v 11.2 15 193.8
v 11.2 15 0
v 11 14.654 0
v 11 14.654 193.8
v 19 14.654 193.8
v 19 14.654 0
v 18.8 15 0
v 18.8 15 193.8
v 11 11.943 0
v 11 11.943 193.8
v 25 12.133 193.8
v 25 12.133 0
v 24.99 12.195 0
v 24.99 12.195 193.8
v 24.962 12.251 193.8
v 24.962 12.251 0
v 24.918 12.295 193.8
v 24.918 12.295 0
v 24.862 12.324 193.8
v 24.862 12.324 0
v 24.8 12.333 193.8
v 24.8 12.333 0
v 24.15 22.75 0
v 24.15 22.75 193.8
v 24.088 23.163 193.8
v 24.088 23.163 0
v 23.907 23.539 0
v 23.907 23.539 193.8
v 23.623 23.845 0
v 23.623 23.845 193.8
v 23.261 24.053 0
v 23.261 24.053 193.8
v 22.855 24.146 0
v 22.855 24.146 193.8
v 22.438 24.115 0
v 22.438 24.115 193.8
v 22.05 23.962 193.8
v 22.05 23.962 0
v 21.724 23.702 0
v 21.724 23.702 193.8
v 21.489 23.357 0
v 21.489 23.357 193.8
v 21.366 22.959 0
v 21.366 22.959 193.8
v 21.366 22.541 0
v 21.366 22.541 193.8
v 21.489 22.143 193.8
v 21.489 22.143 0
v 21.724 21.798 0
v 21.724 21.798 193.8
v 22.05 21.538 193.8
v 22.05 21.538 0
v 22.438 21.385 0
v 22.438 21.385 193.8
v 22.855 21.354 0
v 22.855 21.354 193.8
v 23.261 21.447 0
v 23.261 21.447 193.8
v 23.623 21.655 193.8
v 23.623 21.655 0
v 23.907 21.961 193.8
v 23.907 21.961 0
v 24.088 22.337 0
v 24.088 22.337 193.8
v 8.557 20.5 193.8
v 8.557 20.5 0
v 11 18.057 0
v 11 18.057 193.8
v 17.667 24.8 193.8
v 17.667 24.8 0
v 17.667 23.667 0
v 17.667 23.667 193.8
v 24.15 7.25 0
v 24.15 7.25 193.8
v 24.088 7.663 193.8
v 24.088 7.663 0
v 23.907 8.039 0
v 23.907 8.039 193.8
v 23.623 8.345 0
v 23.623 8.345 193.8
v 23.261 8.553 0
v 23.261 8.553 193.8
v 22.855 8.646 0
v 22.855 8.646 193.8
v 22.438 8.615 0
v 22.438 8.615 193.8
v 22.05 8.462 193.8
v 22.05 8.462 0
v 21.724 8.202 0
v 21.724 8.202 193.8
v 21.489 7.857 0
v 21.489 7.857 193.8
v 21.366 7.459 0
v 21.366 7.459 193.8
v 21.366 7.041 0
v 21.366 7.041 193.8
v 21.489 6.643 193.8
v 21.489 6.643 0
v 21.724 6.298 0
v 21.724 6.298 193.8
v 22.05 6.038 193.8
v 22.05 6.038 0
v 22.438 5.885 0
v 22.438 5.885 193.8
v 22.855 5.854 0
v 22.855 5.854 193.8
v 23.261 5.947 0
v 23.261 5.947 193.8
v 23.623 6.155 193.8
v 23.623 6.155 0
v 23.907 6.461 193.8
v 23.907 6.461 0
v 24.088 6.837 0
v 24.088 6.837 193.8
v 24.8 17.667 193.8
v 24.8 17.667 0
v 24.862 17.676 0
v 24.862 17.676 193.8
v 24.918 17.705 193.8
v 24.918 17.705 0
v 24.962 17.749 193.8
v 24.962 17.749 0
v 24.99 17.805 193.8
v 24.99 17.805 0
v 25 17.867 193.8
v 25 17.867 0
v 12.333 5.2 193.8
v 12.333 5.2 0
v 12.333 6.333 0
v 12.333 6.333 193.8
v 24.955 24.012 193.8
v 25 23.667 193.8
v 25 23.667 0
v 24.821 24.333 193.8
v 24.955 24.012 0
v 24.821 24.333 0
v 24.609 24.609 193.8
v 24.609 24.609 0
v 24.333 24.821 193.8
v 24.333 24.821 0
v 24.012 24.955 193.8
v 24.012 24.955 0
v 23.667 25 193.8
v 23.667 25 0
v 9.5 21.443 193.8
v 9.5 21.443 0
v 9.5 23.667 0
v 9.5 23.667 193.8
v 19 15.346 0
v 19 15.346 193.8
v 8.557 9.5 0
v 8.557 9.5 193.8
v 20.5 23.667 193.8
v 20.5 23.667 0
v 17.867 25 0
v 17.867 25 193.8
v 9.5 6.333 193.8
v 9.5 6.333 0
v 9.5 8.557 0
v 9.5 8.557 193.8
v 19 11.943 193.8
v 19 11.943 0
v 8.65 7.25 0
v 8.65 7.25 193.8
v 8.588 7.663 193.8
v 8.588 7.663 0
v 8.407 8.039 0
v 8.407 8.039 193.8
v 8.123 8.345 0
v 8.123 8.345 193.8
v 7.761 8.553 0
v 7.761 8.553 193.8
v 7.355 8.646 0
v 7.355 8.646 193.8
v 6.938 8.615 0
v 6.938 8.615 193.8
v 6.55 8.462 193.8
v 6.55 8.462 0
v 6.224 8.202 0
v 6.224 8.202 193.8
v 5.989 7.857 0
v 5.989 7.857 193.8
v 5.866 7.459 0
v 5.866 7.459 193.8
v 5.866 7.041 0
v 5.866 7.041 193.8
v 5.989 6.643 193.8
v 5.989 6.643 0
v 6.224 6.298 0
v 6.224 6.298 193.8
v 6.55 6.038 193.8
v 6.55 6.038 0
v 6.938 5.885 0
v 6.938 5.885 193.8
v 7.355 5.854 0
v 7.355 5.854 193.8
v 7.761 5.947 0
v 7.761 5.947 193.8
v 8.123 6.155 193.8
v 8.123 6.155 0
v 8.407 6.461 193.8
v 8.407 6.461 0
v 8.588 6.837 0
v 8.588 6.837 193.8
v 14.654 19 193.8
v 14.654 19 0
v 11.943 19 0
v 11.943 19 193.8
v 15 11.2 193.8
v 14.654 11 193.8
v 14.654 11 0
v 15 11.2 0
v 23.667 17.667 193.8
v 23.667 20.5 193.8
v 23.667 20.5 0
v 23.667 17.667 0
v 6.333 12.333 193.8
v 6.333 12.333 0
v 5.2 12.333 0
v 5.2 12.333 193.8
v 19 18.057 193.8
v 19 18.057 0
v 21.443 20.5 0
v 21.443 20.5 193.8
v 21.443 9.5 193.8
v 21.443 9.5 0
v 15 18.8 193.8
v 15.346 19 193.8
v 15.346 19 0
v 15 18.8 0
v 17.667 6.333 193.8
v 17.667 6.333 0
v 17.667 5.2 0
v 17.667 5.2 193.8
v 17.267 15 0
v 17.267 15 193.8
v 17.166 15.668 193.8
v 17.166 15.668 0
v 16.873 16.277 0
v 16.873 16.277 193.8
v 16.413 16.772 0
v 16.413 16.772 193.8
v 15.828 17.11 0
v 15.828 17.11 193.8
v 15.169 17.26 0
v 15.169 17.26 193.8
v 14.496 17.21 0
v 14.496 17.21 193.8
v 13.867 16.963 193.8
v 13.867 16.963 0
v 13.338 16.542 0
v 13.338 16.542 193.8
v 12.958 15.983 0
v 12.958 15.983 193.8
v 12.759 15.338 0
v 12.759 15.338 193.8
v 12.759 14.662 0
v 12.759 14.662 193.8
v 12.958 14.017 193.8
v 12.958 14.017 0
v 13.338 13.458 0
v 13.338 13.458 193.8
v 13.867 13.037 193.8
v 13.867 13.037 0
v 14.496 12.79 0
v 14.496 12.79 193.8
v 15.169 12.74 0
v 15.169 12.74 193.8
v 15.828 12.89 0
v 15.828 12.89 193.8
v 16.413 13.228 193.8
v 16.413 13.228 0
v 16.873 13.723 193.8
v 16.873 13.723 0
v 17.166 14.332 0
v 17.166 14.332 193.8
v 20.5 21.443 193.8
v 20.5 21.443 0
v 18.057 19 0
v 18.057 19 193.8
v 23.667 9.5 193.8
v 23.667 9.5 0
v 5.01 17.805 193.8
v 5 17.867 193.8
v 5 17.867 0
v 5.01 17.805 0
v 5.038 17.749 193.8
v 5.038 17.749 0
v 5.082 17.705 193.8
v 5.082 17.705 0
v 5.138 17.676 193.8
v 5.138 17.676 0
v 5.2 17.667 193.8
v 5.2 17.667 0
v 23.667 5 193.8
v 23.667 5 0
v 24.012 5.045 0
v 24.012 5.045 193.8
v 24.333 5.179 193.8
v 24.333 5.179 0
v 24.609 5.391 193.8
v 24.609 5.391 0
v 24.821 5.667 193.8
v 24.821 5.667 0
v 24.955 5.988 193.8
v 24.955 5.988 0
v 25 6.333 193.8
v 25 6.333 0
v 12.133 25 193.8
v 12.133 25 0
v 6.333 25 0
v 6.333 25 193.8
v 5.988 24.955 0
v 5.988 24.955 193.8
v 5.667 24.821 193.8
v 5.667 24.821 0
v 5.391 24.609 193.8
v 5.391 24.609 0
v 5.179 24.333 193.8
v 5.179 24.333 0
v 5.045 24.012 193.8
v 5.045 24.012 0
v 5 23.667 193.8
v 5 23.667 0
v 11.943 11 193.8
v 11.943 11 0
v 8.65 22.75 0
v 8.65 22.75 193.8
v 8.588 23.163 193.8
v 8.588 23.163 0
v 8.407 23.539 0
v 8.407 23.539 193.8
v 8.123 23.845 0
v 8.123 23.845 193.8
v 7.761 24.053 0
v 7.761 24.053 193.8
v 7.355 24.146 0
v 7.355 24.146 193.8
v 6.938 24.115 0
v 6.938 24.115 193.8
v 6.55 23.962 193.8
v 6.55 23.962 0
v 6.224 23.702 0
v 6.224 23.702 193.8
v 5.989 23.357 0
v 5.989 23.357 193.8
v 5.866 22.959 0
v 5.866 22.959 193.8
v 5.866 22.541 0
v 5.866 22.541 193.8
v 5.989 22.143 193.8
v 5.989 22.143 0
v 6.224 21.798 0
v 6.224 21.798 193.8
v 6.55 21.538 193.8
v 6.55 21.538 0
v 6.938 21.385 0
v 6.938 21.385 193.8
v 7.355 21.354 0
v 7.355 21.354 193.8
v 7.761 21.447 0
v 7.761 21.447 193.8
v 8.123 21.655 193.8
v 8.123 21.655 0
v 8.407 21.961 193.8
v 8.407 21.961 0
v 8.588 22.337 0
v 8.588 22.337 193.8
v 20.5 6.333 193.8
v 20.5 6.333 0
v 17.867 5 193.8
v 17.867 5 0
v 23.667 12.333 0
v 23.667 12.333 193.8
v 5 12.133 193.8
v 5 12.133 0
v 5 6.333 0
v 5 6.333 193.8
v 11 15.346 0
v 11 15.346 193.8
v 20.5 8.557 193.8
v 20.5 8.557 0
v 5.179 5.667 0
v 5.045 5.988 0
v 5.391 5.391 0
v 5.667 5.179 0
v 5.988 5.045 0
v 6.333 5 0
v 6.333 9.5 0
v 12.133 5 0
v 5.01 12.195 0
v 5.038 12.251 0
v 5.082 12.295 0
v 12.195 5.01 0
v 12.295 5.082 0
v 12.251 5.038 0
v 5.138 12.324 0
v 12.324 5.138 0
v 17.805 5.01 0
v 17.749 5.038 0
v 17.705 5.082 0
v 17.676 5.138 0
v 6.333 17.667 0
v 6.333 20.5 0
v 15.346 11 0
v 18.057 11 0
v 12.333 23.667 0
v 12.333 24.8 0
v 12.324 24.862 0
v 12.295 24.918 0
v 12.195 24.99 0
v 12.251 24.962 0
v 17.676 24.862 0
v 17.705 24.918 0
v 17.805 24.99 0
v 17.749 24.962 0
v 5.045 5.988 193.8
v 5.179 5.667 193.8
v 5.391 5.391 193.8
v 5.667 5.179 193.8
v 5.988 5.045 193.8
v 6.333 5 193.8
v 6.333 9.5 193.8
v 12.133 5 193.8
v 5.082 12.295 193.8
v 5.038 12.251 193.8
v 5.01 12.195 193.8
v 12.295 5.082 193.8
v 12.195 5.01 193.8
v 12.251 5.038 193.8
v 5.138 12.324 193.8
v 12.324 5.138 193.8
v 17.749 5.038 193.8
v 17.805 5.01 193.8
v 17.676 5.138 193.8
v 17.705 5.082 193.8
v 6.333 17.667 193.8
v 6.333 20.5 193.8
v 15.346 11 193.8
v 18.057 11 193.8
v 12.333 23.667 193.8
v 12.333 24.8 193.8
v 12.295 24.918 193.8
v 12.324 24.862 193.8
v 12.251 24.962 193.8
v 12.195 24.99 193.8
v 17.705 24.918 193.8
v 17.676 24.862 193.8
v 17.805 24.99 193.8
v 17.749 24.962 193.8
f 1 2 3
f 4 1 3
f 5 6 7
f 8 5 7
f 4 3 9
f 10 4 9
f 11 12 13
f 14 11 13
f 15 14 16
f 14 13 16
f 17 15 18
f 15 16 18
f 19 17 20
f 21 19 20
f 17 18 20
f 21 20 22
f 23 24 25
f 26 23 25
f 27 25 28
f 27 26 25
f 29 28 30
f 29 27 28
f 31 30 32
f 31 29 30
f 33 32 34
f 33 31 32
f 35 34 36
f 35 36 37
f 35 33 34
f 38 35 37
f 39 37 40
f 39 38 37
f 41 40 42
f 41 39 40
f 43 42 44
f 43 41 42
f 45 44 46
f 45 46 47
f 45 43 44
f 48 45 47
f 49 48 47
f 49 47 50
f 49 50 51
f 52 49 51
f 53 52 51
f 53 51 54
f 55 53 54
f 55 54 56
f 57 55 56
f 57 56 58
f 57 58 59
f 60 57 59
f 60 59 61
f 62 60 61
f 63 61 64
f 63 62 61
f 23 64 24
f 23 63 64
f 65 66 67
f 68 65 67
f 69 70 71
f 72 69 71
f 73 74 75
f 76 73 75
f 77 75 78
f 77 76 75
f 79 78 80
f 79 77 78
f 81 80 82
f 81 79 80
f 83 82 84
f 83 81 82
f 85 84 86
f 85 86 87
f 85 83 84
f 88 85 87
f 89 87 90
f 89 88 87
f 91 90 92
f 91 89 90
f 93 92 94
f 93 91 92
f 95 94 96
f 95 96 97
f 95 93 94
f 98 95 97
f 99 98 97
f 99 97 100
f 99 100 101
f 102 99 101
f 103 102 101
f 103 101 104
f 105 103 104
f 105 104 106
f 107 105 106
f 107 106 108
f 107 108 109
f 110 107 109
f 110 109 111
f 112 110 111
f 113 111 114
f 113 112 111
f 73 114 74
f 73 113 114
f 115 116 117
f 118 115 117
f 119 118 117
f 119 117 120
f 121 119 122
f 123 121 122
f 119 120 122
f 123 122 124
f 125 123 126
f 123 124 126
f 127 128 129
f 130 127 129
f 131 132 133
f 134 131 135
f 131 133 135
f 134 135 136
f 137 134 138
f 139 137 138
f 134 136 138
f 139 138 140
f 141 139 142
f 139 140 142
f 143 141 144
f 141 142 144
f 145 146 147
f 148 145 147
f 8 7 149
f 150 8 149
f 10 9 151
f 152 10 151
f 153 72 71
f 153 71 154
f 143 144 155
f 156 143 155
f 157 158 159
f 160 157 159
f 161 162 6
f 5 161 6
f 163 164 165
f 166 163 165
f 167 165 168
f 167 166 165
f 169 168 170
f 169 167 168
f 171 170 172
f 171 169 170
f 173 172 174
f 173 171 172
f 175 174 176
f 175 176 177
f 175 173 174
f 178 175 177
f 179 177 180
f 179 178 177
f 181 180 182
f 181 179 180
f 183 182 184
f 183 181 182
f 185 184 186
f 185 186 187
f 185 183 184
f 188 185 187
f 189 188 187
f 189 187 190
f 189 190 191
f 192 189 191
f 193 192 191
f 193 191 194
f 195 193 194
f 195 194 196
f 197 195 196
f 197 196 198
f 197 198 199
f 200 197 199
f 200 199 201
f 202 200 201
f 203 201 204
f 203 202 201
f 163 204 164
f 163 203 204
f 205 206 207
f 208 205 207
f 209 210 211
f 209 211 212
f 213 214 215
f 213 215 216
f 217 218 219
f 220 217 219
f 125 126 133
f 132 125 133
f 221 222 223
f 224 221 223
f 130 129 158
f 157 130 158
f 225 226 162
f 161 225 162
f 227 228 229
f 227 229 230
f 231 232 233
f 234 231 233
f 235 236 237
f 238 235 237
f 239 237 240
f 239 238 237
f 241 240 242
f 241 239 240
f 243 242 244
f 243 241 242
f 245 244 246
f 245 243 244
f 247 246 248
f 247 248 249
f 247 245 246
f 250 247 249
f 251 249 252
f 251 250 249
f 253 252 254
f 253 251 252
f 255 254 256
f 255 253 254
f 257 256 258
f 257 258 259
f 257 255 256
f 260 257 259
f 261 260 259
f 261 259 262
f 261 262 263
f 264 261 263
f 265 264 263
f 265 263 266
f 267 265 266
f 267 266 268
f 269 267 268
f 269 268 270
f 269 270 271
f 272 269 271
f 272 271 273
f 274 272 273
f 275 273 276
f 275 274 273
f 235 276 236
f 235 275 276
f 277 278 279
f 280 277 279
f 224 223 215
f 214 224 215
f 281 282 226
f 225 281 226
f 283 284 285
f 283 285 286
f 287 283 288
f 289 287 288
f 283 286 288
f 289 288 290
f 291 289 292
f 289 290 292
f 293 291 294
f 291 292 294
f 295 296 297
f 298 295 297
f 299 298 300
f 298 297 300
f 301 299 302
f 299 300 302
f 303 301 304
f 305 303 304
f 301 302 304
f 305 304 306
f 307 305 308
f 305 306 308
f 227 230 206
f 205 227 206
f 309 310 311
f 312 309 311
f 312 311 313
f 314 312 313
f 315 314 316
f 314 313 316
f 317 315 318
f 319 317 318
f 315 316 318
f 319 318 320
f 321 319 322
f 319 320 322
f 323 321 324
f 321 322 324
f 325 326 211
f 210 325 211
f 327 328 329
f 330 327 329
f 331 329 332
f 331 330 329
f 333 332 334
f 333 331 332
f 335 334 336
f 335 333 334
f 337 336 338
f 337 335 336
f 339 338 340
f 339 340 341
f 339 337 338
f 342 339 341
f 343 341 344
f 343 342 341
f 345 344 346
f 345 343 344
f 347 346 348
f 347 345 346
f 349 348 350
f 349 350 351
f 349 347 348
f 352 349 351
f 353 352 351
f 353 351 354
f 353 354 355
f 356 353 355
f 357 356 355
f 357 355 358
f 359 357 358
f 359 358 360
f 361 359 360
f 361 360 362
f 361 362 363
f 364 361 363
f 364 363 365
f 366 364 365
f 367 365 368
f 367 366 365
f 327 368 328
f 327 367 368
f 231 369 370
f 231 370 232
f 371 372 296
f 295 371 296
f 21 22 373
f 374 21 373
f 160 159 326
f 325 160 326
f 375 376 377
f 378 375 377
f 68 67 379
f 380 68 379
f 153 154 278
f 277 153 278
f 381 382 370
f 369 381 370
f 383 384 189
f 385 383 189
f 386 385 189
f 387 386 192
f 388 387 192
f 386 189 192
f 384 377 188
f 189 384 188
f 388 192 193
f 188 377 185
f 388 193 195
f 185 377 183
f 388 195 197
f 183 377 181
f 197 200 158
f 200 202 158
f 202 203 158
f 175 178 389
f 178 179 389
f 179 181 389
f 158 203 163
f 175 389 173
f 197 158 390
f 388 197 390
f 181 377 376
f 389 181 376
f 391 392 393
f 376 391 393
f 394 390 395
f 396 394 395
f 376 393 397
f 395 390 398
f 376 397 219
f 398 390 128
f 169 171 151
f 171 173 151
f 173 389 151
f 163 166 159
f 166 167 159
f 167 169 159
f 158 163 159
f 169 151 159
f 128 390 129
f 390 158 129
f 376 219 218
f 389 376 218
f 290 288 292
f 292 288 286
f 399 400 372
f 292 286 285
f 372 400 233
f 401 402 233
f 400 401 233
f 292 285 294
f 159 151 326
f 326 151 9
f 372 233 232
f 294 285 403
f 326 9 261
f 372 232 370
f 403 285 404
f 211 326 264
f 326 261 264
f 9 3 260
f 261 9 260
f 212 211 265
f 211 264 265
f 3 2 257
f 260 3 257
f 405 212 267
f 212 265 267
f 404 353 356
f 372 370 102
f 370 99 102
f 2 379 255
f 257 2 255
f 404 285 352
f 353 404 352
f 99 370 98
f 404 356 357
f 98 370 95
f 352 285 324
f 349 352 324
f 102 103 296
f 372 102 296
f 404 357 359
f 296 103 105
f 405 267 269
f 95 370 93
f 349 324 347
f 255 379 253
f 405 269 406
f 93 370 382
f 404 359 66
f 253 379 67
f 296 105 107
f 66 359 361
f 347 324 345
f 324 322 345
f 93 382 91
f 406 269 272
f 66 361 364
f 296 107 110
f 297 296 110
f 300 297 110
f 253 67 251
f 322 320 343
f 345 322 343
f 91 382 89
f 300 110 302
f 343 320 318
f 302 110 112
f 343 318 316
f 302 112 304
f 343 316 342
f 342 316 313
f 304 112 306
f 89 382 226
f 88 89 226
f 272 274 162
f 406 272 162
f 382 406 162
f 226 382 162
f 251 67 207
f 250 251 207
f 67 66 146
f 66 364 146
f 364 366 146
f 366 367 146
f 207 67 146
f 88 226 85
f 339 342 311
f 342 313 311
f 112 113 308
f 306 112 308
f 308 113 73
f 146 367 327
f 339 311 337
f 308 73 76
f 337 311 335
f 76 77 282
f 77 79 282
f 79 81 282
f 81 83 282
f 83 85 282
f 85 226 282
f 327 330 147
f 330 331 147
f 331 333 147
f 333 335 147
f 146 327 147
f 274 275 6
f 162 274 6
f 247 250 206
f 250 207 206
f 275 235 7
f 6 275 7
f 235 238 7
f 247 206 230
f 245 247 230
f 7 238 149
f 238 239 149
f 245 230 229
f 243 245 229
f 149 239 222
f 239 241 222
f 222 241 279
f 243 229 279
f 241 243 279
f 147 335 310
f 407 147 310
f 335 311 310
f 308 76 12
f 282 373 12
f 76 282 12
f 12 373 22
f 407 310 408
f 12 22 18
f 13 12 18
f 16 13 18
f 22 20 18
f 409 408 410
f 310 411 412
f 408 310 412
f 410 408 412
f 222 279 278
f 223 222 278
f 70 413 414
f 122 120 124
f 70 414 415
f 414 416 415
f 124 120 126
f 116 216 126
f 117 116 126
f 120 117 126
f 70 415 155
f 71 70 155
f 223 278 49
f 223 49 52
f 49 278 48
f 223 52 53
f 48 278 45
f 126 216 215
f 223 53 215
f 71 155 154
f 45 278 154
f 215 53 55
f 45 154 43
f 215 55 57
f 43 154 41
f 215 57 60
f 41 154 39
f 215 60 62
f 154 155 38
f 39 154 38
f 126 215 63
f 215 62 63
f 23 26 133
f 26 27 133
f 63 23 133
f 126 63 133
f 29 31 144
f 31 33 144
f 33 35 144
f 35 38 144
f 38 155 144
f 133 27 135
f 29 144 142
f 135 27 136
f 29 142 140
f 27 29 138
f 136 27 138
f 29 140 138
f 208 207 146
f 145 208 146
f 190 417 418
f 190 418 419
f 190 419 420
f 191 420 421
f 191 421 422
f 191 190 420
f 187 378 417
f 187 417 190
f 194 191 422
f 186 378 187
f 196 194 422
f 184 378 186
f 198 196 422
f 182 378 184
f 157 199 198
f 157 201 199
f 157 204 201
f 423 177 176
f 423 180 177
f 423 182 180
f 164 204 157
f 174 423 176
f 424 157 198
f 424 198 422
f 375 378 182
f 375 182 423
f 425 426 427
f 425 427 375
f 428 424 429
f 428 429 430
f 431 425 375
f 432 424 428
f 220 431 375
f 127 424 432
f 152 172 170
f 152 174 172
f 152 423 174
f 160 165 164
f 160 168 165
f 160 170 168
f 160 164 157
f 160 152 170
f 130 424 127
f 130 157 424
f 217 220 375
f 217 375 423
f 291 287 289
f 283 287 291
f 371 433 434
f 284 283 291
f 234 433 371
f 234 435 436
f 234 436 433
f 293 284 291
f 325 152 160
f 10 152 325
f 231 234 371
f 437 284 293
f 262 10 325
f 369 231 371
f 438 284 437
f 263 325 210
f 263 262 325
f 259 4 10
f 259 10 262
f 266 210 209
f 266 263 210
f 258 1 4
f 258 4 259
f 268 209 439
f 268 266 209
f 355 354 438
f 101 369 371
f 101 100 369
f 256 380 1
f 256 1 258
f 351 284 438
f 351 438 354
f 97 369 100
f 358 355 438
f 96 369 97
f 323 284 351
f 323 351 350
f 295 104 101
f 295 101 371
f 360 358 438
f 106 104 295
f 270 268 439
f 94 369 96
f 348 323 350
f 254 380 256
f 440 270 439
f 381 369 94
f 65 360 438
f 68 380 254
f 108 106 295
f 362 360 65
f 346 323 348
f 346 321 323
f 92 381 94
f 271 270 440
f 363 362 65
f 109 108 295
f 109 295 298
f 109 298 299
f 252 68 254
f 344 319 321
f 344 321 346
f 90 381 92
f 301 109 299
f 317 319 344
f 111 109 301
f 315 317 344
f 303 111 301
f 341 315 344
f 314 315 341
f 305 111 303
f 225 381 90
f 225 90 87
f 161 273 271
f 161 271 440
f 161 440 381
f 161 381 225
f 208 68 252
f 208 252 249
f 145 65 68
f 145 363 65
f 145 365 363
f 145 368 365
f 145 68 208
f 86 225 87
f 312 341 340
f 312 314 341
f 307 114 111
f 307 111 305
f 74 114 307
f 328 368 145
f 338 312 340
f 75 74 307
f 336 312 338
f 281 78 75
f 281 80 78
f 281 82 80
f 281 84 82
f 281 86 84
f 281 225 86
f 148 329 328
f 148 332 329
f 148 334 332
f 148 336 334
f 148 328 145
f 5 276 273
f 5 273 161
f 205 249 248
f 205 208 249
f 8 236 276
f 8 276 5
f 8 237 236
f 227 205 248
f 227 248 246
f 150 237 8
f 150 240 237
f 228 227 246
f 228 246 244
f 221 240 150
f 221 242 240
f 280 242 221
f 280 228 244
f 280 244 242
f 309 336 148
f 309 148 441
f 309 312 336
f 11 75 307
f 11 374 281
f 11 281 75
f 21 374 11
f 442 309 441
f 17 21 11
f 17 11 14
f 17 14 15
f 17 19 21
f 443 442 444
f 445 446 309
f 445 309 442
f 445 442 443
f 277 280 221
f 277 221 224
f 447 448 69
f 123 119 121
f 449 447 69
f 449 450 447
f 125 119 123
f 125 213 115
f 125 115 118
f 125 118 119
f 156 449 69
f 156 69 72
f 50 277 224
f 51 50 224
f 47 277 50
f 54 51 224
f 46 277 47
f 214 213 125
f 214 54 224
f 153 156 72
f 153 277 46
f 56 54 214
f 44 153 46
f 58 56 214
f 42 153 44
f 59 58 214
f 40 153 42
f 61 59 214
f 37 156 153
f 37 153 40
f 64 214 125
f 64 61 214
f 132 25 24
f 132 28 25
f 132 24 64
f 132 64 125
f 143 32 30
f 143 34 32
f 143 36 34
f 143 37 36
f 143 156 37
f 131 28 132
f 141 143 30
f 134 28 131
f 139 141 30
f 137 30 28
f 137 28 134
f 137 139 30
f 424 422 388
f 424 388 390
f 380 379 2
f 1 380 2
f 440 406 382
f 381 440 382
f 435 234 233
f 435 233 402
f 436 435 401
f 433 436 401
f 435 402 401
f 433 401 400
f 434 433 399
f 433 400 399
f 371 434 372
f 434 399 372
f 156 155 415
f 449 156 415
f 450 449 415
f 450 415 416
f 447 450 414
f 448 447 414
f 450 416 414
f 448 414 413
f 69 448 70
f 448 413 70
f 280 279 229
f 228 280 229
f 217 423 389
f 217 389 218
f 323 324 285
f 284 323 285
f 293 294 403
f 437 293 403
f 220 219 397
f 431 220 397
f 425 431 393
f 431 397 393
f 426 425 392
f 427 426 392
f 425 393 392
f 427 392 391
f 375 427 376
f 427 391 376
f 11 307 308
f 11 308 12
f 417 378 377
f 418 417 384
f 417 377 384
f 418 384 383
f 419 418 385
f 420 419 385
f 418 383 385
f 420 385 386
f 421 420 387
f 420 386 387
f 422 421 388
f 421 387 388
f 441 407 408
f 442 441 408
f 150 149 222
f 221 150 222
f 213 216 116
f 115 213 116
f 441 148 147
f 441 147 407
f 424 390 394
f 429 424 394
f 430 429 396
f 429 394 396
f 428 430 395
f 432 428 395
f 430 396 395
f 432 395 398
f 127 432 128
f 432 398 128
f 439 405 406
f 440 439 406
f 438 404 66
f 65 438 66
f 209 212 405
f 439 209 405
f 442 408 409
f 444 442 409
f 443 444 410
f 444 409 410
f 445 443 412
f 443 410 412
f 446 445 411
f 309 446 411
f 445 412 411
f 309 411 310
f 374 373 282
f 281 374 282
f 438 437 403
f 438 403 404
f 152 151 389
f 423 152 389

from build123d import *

# Parameters (mm, degrees)
SKETCH_1_R      = 1.4
SKETCH_1_R_2    = 2.266666667
EXTRUDE_1_DEPTH = 193.8


with BuildPart() as part:
    # 草图1 → 凸台-拉伸1 (new body)
    with BuildSketch(Plane.XY):
        with BuildLine():
            Line((5, 23.666666667), (5, 17.866666667))
            ThreePointArc((5, 17.866666667), (5.058578644, 17.72524531), (5.2, 17.666666667))
            Line((5.2, 17.666666667), (6.333333333, 17.666666667))
            Line((6.333333333, 17.666666667), (6.333333333, 20.5))
            Line((6.333333333, 20.5), (8.557190958, 20.5))
            Line((8.557190958, 20.5), (11, 18.057190958))
            Line((11, 18.057190958), (11, 15.346410162))
            Line((11, 15.346410162), (11.199999976, 15.000000042))
            Line((11.199999976, 15.000000042), (11, 14.653589838))
            Line((11, 14.653589838), (11, 11.942809042))
            Line((11, 11.942809042), (8.557190958, 9.5))
            Line((8.557190958, 9.5), (6.333333333, 9.5))
            Line((6.333333333, 9.5), (6.333333333, 12.333333333))
            Line((6.333333333, 12.333333333), (5.2, 12.333333333))
            ThreePointArc((5.2, 12.333333333), (5.058578644, 12.27475469), (5, 12.133333333))
            Line((5, 12.133333333), (5, 6.333333333))
            ThreePointArc((5, 6.333333333), (5.390524292, 5.390524292), (6.333333333, 5))
            Line((6.333333333, 5), (12.133333333, 5))
            ThreePointArc((12.133333333, 5), (12.27475469, 5.058578644), (12.333333333, 5.2))
            Line((12.333333333, 5.2), (12.333333333, 6.333333333))
            Line((12.333333333, 6.333333333), (9.5, 6.333333333))
            Line((9.5, 6.333333333), (9.5, 8.557190958))
            Line((9.5, 8.557190958), (11.942809042, 11))
            Line((11.942809042, 11), (14.653589838, 11))
            Line((14.653589838, 11), (14.999999928, 11.199999958))
            Line((14.999999928, 11.199999958), (15.346410162, 11))
            Line((15.346410162, 11), (18.057190958, 11))
            Line((18.057190958, 11), (20.5, 8.557190958))
            Line((20.5, 8.557190958), (20.5, 6.333333333))
            Line((20.5, 6.333333333), (17.666666667, 6.333333333))
            Line((17.666666667, 6.333333333), (17.666666667, 5.2))
            ThreePointArc((17.666666667, 5.2), (17.72524531, 5.058578644), (17.866666667, 5))
            Line((17.866666667, 5), (23.666666667, 5))
            ThreePointArc((23.666666667, 5), (24.609475708, 5.390524292), (25, 6.333333333))
            Line((25, 6.333333333), (25, 12.133333333))
            ThreePointArc((25, 12.133333333), (24.941421356, 12.27475469), (24.8, 12.333333333))
            Line((24.8, 12.333333333), (23.666666667, 12.333333333))
            Line((23.666666667, 12.333333333), (23.666666667, 9.5))
            Line((23.666666667, 9.5), (21.442809042, 9.5))
            Line((21.442809042, 9.5), (19, 11.942809042))
            Line((19, 11.942809042), (19, 14.653589838))
            Line((19, 14.653589838), (18.800000024, 14.999999958))
            Line((18.800000024, 14.999999958), (19, 15.346410162))
            Line((19, 15.346410162), (19, 18.057190958))
            Line((19, 18.057190958), (21.442809042, 20.5))
            Line((21.442809042, 20.5), (23.666666667, 20.5))
            Line((23.666666667, 20.5), (23.666666667, 17.666666667))
            Line((23.666666667, 17.666666667), (24.8, 17.666666667))
            ThreePointArc((24.8, 17.666666667), (24.941421356, 17.72524531), (25, 17.866666667))
            Line((25, 17.866666667), (25, 23.666666667))
            ThreePointArc((25, 23.666666667), (24.609475708, 24.609475708), (23.666666667, 25))
            Line((23.666666667, 25), (17.866666667, 25))
            ThreePointArc((17.866666667, 25), (17.72524531, 24.941421356), (17.666666667, 24.8))
            Line((17.666666667, 24.8), (17.666666667, 23.666666667))
            Line((17.666666667, 23.666666667), (20.5, 23.666666667))
            Line((20.5, 23.666666667), (20.5, 21.442809042))
            Line((20.5, 21.442809042), (18.057190958, 19))
            Line((18.057190958, 19), (15.346410162, 19))
            Line((15.346410162, 19), (15.000000072, 18.800000042))
            Line((15.000000072, 18.800000042), (14.653589838, 19))
            Line((14.653589838, 19), (11.942809042, 19))
            Line((11.942809042, 19), (9.5, 21.442809042))
            Line((9.5, 21.442809042), (9.5, 23.666666667))
            Line((9.5, 23.666666667), (12.333333333, 23.666666667))
            Line((12.333333333, 23.666666667), (12.333333333, 24.8))
            ThreePointArc((12.333333333, 24.8), (12.27475469, 24.941421356), (12.133333333, 25))
            Line((12.133333333, 25), (6.333333333, 25))
            ThreePointArc((6.333333333, 25), (5.390524292, 24.609475708), (5, 23.666666667))
        make_face()
        with Locations((7.25, 22.75)):
            Circle(SKETCH_1_R, mode=Mode.SUBTRACT)
        with Locations((22.75, 22.75)):
            Circle(SKETCH_1_R, mode=Mode.SUBTRACT)
        with Locations((15, 15)):
            Circle(SKETCH_1_R_2, mode=Mode.SUBTRACT)
        with Locations((7.25, 7.25)):
            Circle(SKETCH_1_R, mode=Mode.SUBTRACT)
        with Locations((22.75, 7.25)):
            Circle(SKETCH_1_R, mode=Mode.SUBTRACT)
    extrude(amount=EXTRUDE_1_DEPTH)


solid = part.part
